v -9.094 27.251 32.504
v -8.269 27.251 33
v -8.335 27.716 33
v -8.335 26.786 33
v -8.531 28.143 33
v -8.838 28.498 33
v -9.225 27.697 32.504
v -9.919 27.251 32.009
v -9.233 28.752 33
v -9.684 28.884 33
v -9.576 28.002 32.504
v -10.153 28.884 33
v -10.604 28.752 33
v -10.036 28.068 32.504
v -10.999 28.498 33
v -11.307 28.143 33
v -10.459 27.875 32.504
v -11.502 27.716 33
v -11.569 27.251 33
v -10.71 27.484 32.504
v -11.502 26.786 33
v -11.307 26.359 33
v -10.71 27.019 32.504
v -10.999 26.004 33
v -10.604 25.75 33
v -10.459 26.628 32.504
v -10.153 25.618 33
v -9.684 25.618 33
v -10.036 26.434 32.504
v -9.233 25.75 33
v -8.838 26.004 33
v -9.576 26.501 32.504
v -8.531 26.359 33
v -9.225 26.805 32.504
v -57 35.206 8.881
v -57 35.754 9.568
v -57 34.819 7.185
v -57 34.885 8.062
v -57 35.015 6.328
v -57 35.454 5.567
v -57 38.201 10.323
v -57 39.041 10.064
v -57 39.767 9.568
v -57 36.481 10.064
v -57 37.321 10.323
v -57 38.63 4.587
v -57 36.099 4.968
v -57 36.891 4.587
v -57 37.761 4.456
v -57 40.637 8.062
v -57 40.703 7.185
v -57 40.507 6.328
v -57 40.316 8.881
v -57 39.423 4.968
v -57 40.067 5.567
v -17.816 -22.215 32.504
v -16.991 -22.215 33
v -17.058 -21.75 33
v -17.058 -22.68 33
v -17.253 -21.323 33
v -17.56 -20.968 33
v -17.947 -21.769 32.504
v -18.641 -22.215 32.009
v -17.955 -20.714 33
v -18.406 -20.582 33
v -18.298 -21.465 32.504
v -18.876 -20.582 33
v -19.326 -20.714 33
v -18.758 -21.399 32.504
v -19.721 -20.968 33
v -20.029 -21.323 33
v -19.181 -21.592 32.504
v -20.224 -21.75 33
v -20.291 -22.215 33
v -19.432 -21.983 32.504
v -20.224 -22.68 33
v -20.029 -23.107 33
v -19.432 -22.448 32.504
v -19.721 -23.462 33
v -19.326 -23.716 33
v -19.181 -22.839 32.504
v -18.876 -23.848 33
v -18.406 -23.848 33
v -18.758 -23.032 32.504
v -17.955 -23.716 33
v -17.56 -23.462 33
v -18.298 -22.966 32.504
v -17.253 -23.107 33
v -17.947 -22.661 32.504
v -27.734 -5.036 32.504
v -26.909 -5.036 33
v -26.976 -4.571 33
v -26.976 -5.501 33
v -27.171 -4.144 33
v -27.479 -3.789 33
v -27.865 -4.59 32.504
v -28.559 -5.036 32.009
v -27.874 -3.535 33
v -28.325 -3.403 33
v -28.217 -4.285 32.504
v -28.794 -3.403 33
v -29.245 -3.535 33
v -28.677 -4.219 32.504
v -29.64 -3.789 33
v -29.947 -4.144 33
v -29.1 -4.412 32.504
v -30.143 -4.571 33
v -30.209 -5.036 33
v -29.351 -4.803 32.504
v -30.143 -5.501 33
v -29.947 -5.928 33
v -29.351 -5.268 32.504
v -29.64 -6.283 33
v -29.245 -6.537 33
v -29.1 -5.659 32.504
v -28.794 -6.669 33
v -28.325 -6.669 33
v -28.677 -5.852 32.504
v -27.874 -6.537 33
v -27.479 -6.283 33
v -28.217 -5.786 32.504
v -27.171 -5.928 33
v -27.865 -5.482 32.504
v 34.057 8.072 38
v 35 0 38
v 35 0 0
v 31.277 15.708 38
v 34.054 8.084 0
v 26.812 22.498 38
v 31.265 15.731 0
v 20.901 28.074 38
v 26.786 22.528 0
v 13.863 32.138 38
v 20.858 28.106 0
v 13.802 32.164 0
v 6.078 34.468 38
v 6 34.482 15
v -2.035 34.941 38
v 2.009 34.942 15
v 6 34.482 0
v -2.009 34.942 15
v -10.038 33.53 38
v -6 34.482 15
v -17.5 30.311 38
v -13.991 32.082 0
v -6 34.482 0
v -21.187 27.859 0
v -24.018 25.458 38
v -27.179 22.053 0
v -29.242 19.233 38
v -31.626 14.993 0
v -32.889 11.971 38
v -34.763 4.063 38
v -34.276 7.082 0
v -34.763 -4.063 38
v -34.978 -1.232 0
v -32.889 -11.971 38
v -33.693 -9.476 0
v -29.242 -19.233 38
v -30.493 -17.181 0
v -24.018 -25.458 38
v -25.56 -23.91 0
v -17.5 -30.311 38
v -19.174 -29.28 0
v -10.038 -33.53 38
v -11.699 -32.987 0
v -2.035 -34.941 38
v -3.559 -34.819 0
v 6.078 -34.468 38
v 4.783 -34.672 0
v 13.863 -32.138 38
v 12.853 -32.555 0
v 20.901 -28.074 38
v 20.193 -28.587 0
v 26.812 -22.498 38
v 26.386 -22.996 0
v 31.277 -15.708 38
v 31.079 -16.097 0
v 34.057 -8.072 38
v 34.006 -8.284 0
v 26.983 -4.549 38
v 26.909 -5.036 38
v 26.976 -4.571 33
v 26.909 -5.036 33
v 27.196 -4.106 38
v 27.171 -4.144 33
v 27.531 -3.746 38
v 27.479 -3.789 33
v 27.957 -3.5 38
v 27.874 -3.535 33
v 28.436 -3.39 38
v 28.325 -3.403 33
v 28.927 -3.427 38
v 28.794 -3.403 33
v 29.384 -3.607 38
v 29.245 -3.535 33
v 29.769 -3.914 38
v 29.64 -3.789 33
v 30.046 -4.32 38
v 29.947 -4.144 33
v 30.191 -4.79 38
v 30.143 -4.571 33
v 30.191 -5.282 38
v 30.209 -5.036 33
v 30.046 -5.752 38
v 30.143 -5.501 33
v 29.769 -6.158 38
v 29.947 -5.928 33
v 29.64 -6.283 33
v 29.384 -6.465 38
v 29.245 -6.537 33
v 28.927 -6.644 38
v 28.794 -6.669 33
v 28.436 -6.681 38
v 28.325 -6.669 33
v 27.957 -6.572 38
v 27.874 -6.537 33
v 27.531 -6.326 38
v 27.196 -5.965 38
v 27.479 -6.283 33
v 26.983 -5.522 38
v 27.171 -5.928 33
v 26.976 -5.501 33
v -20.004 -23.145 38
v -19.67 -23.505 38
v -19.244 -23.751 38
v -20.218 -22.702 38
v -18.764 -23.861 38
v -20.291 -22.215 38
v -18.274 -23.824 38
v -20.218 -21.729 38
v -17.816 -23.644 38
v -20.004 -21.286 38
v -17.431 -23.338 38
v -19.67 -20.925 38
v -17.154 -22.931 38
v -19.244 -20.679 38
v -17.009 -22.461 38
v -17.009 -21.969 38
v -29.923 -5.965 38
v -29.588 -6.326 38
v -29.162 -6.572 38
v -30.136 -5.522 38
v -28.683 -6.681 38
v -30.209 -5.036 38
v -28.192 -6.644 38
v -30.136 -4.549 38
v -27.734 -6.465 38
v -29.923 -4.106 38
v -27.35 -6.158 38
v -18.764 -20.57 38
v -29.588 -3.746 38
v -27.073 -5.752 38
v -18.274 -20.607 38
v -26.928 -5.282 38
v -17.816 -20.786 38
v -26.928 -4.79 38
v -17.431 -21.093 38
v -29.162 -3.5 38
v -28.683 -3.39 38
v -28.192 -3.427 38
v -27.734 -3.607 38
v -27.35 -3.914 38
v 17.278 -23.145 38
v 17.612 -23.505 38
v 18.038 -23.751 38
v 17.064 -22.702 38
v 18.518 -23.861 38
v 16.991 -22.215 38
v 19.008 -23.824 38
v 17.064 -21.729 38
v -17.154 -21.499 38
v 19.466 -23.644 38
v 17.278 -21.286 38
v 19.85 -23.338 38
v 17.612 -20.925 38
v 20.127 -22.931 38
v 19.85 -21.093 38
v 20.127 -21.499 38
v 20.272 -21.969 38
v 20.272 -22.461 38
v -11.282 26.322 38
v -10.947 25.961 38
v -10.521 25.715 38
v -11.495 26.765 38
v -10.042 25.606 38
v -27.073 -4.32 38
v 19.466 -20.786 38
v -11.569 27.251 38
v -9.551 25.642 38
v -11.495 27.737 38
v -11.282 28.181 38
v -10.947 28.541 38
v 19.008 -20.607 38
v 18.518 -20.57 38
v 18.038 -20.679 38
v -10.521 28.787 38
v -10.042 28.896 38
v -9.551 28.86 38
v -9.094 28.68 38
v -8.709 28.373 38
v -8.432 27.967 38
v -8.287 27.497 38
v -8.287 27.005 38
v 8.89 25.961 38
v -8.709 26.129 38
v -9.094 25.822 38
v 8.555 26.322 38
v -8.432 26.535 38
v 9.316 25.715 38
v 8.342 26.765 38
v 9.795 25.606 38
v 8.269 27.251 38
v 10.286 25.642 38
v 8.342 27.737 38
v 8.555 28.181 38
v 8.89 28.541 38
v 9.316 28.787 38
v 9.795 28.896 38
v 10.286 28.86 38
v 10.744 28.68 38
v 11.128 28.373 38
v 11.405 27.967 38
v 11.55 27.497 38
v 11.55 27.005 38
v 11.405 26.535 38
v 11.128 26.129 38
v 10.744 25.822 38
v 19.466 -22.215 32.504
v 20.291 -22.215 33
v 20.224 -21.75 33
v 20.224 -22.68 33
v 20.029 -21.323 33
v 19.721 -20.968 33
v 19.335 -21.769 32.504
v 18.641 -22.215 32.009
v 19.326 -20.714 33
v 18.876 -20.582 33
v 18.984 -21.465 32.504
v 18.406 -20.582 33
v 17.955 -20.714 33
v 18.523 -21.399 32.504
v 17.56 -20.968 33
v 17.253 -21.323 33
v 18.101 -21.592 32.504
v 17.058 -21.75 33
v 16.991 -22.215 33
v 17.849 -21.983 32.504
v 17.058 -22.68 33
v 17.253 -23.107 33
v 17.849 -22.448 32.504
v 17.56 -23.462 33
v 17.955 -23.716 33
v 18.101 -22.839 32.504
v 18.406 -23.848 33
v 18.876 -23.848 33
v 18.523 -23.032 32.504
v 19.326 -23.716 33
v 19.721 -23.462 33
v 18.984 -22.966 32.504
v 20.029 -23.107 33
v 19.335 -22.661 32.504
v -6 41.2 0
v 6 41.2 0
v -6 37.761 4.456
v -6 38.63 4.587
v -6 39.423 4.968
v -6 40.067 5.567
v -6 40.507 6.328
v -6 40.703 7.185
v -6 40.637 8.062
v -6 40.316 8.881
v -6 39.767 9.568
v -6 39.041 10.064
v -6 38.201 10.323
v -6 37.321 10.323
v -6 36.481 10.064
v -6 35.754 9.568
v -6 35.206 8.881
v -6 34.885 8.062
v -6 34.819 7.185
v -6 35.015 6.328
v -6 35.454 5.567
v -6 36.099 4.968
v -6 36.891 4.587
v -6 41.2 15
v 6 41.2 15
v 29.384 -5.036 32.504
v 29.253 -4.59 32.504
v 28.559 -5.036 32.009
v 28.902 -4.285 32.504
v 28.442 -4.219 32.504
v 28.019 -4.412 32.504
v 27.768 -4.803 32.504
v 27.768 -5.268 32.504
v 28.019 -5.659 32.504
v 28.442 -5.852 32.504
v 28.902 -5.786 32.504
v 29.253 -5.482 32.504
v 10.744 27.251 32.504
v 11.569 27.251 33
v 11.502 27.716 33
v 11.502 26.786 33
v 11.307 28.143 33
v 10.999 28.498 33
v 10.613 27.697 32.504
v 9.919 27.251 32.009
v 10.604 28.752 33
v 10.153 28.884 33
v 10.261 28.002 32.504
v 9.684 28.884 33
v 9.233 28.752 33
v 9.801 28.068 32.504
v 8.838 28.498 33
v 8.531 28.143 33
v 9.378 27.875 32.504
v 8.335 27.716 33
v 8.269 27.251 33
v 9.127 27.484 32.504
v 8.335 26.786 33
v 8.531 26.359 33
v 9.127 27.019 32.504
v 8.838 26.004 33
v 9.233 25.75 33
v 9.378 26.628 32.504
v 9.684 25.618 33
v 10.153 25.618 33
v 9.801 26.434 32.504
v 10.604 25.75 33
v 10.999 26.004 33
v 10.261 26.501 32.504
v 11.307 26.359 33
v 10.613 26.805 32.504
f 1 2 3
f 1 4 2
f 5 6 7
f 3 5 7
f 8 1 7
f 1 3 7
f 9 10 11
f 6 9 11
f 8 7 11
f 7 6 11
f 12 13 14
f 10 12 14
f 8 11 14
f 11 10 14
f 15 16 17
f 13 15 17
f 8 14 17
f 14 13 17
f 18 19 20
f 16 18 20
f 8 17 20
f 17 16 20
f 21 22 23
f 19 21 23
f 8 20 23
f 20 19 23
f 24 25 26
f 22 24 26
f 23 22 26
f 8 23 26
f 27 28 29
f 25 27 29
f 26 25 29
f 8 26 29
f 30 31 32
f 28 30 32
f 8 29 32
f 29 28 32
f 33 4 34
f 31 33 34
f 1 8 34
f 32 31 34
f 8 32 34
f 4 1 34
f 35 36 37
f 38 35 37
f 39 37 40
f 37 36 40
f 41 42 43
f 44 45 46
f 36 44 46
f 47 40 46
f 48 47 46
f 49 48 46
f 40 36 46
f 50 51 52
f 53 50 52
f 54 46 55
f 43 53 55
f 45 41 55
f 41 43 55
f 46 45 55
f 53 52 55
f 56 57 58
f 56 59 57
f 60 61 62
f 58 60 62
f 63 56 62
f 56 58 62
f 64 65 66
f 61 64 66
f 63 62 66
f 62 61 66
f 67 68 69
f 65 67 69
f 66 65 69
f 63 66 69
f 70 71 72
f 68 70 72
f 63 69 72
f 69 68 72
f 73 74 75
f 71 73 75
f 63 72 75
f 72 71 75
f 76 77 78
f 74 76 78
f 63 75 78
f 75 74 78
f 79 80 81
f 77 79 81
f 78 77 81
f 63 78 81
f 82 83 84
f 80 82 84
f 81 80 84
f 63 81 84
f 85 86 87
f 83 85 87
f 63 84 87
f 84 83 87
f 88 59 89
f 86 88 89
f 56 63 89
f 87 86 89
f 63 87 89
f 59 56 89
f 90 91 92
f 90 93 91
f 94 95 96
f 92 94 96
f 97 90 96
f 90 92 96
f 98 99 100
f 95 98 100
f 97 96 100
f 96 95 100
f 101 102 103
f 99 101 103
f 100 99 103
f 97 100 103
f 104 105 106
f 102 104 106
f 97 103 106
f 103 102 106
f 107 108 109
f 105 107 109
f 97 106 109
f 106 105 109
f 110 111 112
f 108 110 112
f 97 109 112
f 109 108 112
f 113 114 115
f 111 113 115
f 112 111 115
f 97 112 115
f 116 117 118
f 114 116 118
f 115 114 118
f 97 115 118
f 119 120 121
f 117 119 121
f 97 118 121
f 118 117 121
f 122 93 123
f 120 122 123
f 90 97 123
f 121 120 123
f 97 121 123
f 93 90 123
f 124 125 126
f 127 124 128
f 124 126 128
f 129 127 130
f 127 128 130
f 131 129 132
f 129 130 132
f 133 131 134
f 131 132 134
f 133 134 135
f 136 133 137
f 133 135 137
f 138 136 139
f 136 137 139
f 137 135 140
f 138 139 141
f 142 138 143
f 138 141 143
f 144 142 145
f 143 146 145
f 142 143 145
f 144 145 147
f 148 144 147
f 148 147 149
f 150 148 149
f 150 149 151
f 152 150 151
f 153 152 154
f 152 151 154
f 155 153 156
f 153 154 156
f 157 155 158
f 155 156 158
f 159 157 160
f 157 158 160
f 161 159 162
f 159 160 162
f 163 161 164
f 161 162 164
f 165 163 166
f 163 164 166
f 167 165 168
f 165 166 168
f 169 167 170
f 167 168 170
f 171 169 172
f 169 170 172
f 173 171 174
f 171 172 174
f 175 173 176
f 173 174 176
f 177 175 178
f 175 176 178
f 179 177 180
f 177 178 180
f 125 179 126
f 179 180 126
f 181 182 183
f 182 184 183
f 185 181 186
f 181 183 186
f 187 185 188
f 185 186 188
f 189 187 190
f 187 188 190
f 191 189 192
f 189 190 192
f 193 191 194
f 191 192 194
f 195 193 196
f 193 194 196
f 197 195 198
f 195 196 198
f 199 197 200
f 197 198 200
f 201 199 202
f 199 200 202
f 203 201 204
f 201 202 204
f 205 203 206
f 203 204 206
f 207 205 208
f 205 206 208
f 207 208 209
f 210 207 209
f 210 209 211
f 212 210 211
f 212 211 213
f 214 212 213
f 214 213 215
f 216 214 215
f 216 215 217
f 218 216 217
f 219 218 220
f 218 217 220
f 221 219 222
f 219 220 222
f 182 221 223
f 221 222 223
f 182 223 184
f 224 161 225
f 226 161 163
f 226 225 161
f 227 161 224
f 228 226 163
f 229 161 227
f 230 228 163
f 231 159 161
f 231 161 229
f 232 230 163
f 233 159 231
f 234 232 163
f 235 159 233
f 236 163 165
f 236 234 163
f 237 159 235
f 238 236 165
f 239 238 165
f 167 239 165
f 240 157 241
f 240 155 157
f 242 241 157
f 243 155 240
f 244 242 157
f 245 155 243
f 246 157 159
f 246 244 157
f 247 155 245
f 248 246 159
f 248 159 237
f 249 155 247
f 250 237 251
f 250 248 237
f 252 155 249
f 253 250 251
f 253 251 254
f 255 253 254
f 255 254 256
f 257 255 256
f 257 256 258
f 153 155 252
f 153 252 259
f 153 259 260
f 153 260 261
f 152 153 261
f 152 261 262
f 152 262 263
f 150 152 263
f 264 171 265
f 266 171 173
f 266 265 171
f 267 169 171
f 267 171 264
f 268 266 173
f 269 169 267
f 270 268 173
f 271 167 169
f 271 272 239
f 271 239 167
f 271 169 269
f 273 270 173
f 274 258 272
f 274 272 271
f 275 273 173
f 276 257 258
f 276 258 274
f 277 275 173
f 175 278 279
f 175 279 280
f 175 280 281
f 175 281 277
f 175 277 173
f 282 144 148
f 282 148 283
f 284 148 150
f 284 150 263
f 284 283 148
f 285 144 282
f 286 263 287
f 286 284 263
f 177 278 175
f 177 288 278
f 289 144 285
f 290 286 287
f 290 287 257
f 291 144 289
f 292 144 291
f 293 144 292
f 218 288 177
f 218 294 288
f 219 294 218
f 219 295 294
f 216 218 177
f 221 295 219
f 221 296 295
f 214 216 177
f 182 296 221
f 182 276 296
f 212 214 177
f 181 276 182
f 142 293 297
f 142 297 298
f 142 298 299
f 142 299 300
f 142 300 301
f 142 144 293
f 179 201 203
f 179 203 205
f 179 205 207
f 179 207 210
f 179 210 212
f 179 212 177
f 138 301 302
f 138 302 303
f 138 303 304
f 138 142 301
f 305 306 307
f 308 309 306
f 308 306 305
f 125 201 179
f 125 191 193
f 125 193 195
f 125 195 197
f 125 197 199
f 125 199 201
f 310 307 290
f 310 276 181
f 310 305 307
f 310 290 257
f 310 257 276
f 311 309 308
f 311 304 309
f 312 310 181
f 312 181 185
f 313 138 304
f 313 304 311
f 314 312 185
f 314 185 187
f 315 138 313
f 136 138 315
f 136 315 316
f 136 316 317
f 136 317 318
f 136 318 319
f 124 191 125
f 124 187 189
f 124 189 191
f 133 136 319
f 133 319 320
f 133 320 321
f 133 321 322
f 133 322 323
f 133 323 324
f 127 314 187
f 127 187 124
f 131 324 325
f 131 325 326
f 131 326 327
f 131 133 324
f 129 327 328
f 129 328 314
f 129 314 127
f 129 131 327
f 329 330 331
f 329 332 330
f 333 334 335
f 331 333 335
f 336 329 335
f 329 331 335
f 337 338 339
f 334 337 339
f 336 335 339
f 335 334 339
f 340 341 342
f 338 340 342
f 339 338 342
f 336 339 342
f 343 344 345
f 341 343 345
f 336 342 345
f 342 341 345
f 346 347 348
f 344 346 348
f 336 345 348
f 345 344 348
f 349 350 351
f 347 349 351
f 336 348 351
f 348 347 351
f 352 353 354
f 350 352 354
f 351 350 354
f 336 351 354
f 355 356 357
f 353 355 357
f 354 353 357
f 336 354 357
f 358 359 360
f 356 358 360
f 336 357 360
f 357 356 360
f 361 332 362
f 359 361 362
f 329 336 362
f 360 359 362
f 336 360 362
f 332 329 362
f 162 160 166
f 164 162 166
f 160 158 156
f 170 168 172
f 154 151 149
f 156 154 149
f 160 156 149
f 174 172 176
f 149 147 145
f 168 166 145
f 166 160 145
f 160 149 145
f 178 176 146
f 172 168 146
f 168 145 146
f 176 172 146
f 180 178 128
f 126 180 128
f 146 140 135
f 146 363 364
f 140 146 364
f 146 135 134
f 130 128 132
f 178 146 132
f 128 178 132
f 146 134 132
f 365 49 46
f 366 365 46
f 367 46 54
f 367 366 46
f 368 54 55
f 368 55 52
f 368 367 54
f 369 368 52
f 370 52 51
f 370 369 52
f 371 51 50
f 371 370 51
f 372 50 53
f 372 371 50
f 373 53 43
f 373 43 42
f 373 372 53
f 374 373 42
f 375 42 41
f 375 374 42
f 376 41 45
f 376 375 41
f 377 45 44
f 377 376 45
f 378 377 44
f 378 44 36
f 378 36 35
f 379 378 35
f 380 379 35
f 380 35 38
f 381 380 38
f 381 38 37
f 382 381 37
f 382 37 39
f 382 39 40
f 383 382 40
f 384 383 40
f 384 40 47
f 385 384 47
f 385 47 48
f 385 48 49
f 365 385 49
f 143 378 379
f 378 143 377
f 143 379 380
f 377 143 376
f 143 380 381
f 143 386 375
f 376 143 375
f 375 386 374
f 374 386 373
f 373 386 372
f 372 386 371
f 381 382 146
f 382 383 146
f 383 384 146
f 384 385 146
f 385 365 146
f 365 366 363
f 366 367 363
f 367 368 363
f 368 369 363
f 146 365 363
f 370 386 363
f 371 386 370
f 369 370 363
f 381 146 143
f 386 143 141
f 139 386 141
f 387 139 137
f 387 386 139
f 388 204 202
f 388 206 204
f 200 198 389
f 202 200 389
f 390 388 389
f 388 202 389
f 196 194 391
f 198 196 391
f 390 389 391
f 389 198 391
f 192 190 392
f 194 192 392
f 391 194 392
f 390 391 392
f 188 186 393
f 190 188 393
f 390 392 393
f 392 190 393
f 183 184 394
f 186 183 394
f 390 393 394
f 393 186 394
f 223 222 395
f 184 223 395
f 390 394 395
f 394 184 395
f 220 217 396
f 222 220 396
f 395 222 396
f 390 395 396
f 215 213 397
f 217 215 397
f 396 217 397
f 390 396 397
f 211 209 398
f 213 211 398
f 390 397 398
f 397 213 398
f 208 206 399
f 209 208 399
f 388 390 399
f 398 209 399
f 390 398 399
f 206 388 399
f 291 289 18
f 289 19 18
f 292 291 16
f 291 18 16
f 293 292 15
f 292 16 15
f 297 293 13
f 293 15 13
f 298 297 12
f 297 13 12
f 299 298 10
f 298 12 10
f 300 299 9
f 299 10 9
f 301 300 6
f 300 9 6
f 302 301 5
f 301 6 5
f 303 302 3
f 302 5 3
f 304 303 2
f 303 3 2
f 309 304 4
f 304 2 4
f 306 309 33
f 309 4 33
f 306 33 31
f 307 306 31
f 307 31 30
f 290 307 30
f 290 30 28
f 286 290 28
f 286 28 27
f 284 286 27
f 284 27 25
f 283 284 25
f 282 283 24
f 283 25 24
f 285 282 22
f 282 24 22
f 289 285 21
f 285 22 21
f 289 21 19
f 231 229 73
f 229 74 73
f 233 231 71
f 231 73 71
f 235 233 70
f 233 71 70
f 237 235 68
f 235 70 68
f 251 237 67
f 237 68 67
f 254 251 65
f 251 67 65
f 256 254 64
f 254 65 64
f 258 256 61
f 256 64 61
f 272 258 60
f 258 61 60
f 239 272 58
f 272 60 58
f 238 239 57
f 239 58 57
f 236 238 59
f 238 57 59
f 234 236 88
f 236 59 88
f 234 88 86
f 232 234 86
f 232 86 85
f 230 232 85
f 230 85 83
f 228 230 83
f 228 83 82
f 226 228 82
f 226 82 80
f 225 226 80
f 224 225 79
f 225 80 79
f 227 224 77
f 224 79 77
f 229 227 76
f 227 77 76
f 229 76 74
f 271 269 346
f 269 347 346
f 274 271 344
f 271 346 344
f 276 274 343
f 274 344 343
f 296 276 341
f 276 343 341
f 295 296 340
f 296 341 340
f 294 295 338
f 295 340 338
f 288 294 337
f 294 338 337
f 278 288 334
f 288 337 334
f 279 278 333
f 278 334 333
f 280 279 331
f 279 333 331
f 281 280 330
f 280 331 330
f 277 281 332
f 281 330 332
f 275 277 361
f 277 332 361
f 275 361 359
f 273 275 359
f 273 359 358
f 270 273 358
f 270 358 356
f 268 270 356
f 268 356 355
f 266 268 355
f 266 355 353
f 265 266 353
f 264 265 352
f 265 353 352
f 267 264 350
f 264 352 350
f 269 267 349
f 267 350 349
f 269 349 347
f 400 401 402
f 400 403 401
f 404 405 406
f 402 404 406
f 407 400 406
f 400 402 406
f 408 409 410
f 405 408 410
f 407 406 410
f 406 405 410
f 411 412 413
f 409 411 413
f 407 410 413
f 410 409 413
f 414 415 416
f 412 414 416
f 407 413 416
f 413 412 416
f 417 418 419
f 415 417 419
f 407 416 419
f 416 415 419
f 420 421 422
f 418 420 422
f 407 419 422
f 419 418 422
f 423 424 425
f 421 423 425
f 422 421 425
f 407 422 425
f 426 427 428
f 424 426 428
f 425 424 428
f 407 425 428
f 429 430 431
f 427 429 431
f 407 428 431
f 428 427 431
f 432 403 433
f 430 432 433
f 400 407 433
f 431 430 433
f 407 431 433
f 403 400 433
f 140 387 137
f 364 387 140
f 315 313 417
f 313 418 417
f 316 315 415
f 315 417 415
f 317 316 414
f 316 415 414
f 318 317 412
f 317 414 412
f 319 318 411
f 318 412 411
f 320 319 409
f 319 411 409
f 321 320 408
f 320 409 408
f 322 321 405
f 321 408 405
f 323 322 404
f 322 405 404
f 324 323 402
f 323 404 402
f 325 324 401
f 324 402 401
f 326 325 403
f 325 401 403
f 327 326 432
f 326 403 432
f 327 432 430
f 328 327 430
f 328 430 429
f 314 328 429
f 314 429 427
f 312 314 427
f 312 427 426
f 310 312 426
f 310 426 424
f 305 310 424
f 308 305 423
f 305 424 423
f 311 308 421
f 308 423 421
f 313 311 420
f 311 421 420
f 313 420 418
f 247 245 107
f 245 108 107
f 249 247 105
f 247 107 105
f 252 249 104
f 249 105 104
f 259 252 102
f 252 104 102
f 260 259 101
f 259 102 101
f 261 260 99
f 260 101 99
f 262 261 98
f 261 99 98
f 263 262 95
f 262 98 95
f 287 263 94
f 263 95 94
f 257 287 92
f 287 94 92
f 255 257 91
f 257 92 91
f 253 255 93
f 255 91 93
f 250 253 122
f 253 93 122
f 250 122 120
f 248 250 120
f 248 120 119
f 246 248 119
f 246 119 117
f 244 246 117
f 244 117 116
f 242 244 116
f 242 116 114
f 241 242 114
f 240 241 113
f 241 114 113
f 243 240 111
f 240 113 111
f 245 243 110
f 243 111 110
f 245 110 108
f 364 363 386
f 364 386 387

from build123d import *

# Parameters (mm, degrees)
SKETCH_1_R             = 35
EXTRUDE_1_DEPTH        = 38
SKETCH_2_W             = 12
SKETCH_2_H             = 15
EXTRUDE_2_DEPTH        = 11
SKETCH_3_R             = 2.95
EXTRUDE_3_DEPTH        = 63
HOLE_WIZARD_M4_1_D     = 3.3
HOLE_WIZARD_M4_1_DEPTH = 5
HOLE_WIZARD_M4_1_TIP   = 0.991420021


with BuildPart() as part:
    # 草图1 → 凸台-拉伸1 (new body)
    with BuildSketch(Plane.XY):
        Circle(SKETCH_1_R)
    extrude(amount=EXTRUDE_1_DEPTH)

    # 草图2 → 凸台-拉伸2 (add)
    with BuildSketch(Plane(origin=(0, 41.2, 0), x_dir=(1, 0, 0), z_dir=(0, 1, 0))):
        with Locations((0, -7.5)):
            Rectangle(SKETCH_2_W, SKETCH_2_H)
    extrude(amount=-EXTRUDE_2_DEPTH)

    # 草图3 → 凸台-拉伸3 (add)
    with BuildSketch(Plane(origin=(6, 0, 0), x_dir=(0, 0, -1), z_dir=(1, 0, 0))):
        with Locations((-7.405885861, 37.760893476)):
            Circle(SKETCH_3_R)
    extrude(amount=-EXTRUDE_3_DEPTH)

    # M4 螺纹孔的螺纹孔钻头1
    with Locations(Plane(origin=(-9.918584156, 27.251086003, 38), x_dir=(1, 0, 0), z_dir=(0, 0, 1))):
        with Locations((0, 0), (19.837168312, 0), (38.478008993, -32.286883155), (28.559424837, -49.466374853), (-8.722256525, -49.466374853), (-18.640840681, -32.286883155)):
            Hole(HOLE_WIZARD_M4_1_D / 2, depth=HOLE_WIZARD_M4_1_DEPTH)
            with Locations((0, 0, -(HOLE_WIZARD_M4_1_DEPTH + HOLE_WIZARD_M4_1_TIP / 2))):  # 118° drill point
                Cone(0, HOLE_WIZARD_M4_1_D / 2, HOLE_WIZARD_M4_1_TIP, mode=Mode.SUBTRACT)


solid = part.part
